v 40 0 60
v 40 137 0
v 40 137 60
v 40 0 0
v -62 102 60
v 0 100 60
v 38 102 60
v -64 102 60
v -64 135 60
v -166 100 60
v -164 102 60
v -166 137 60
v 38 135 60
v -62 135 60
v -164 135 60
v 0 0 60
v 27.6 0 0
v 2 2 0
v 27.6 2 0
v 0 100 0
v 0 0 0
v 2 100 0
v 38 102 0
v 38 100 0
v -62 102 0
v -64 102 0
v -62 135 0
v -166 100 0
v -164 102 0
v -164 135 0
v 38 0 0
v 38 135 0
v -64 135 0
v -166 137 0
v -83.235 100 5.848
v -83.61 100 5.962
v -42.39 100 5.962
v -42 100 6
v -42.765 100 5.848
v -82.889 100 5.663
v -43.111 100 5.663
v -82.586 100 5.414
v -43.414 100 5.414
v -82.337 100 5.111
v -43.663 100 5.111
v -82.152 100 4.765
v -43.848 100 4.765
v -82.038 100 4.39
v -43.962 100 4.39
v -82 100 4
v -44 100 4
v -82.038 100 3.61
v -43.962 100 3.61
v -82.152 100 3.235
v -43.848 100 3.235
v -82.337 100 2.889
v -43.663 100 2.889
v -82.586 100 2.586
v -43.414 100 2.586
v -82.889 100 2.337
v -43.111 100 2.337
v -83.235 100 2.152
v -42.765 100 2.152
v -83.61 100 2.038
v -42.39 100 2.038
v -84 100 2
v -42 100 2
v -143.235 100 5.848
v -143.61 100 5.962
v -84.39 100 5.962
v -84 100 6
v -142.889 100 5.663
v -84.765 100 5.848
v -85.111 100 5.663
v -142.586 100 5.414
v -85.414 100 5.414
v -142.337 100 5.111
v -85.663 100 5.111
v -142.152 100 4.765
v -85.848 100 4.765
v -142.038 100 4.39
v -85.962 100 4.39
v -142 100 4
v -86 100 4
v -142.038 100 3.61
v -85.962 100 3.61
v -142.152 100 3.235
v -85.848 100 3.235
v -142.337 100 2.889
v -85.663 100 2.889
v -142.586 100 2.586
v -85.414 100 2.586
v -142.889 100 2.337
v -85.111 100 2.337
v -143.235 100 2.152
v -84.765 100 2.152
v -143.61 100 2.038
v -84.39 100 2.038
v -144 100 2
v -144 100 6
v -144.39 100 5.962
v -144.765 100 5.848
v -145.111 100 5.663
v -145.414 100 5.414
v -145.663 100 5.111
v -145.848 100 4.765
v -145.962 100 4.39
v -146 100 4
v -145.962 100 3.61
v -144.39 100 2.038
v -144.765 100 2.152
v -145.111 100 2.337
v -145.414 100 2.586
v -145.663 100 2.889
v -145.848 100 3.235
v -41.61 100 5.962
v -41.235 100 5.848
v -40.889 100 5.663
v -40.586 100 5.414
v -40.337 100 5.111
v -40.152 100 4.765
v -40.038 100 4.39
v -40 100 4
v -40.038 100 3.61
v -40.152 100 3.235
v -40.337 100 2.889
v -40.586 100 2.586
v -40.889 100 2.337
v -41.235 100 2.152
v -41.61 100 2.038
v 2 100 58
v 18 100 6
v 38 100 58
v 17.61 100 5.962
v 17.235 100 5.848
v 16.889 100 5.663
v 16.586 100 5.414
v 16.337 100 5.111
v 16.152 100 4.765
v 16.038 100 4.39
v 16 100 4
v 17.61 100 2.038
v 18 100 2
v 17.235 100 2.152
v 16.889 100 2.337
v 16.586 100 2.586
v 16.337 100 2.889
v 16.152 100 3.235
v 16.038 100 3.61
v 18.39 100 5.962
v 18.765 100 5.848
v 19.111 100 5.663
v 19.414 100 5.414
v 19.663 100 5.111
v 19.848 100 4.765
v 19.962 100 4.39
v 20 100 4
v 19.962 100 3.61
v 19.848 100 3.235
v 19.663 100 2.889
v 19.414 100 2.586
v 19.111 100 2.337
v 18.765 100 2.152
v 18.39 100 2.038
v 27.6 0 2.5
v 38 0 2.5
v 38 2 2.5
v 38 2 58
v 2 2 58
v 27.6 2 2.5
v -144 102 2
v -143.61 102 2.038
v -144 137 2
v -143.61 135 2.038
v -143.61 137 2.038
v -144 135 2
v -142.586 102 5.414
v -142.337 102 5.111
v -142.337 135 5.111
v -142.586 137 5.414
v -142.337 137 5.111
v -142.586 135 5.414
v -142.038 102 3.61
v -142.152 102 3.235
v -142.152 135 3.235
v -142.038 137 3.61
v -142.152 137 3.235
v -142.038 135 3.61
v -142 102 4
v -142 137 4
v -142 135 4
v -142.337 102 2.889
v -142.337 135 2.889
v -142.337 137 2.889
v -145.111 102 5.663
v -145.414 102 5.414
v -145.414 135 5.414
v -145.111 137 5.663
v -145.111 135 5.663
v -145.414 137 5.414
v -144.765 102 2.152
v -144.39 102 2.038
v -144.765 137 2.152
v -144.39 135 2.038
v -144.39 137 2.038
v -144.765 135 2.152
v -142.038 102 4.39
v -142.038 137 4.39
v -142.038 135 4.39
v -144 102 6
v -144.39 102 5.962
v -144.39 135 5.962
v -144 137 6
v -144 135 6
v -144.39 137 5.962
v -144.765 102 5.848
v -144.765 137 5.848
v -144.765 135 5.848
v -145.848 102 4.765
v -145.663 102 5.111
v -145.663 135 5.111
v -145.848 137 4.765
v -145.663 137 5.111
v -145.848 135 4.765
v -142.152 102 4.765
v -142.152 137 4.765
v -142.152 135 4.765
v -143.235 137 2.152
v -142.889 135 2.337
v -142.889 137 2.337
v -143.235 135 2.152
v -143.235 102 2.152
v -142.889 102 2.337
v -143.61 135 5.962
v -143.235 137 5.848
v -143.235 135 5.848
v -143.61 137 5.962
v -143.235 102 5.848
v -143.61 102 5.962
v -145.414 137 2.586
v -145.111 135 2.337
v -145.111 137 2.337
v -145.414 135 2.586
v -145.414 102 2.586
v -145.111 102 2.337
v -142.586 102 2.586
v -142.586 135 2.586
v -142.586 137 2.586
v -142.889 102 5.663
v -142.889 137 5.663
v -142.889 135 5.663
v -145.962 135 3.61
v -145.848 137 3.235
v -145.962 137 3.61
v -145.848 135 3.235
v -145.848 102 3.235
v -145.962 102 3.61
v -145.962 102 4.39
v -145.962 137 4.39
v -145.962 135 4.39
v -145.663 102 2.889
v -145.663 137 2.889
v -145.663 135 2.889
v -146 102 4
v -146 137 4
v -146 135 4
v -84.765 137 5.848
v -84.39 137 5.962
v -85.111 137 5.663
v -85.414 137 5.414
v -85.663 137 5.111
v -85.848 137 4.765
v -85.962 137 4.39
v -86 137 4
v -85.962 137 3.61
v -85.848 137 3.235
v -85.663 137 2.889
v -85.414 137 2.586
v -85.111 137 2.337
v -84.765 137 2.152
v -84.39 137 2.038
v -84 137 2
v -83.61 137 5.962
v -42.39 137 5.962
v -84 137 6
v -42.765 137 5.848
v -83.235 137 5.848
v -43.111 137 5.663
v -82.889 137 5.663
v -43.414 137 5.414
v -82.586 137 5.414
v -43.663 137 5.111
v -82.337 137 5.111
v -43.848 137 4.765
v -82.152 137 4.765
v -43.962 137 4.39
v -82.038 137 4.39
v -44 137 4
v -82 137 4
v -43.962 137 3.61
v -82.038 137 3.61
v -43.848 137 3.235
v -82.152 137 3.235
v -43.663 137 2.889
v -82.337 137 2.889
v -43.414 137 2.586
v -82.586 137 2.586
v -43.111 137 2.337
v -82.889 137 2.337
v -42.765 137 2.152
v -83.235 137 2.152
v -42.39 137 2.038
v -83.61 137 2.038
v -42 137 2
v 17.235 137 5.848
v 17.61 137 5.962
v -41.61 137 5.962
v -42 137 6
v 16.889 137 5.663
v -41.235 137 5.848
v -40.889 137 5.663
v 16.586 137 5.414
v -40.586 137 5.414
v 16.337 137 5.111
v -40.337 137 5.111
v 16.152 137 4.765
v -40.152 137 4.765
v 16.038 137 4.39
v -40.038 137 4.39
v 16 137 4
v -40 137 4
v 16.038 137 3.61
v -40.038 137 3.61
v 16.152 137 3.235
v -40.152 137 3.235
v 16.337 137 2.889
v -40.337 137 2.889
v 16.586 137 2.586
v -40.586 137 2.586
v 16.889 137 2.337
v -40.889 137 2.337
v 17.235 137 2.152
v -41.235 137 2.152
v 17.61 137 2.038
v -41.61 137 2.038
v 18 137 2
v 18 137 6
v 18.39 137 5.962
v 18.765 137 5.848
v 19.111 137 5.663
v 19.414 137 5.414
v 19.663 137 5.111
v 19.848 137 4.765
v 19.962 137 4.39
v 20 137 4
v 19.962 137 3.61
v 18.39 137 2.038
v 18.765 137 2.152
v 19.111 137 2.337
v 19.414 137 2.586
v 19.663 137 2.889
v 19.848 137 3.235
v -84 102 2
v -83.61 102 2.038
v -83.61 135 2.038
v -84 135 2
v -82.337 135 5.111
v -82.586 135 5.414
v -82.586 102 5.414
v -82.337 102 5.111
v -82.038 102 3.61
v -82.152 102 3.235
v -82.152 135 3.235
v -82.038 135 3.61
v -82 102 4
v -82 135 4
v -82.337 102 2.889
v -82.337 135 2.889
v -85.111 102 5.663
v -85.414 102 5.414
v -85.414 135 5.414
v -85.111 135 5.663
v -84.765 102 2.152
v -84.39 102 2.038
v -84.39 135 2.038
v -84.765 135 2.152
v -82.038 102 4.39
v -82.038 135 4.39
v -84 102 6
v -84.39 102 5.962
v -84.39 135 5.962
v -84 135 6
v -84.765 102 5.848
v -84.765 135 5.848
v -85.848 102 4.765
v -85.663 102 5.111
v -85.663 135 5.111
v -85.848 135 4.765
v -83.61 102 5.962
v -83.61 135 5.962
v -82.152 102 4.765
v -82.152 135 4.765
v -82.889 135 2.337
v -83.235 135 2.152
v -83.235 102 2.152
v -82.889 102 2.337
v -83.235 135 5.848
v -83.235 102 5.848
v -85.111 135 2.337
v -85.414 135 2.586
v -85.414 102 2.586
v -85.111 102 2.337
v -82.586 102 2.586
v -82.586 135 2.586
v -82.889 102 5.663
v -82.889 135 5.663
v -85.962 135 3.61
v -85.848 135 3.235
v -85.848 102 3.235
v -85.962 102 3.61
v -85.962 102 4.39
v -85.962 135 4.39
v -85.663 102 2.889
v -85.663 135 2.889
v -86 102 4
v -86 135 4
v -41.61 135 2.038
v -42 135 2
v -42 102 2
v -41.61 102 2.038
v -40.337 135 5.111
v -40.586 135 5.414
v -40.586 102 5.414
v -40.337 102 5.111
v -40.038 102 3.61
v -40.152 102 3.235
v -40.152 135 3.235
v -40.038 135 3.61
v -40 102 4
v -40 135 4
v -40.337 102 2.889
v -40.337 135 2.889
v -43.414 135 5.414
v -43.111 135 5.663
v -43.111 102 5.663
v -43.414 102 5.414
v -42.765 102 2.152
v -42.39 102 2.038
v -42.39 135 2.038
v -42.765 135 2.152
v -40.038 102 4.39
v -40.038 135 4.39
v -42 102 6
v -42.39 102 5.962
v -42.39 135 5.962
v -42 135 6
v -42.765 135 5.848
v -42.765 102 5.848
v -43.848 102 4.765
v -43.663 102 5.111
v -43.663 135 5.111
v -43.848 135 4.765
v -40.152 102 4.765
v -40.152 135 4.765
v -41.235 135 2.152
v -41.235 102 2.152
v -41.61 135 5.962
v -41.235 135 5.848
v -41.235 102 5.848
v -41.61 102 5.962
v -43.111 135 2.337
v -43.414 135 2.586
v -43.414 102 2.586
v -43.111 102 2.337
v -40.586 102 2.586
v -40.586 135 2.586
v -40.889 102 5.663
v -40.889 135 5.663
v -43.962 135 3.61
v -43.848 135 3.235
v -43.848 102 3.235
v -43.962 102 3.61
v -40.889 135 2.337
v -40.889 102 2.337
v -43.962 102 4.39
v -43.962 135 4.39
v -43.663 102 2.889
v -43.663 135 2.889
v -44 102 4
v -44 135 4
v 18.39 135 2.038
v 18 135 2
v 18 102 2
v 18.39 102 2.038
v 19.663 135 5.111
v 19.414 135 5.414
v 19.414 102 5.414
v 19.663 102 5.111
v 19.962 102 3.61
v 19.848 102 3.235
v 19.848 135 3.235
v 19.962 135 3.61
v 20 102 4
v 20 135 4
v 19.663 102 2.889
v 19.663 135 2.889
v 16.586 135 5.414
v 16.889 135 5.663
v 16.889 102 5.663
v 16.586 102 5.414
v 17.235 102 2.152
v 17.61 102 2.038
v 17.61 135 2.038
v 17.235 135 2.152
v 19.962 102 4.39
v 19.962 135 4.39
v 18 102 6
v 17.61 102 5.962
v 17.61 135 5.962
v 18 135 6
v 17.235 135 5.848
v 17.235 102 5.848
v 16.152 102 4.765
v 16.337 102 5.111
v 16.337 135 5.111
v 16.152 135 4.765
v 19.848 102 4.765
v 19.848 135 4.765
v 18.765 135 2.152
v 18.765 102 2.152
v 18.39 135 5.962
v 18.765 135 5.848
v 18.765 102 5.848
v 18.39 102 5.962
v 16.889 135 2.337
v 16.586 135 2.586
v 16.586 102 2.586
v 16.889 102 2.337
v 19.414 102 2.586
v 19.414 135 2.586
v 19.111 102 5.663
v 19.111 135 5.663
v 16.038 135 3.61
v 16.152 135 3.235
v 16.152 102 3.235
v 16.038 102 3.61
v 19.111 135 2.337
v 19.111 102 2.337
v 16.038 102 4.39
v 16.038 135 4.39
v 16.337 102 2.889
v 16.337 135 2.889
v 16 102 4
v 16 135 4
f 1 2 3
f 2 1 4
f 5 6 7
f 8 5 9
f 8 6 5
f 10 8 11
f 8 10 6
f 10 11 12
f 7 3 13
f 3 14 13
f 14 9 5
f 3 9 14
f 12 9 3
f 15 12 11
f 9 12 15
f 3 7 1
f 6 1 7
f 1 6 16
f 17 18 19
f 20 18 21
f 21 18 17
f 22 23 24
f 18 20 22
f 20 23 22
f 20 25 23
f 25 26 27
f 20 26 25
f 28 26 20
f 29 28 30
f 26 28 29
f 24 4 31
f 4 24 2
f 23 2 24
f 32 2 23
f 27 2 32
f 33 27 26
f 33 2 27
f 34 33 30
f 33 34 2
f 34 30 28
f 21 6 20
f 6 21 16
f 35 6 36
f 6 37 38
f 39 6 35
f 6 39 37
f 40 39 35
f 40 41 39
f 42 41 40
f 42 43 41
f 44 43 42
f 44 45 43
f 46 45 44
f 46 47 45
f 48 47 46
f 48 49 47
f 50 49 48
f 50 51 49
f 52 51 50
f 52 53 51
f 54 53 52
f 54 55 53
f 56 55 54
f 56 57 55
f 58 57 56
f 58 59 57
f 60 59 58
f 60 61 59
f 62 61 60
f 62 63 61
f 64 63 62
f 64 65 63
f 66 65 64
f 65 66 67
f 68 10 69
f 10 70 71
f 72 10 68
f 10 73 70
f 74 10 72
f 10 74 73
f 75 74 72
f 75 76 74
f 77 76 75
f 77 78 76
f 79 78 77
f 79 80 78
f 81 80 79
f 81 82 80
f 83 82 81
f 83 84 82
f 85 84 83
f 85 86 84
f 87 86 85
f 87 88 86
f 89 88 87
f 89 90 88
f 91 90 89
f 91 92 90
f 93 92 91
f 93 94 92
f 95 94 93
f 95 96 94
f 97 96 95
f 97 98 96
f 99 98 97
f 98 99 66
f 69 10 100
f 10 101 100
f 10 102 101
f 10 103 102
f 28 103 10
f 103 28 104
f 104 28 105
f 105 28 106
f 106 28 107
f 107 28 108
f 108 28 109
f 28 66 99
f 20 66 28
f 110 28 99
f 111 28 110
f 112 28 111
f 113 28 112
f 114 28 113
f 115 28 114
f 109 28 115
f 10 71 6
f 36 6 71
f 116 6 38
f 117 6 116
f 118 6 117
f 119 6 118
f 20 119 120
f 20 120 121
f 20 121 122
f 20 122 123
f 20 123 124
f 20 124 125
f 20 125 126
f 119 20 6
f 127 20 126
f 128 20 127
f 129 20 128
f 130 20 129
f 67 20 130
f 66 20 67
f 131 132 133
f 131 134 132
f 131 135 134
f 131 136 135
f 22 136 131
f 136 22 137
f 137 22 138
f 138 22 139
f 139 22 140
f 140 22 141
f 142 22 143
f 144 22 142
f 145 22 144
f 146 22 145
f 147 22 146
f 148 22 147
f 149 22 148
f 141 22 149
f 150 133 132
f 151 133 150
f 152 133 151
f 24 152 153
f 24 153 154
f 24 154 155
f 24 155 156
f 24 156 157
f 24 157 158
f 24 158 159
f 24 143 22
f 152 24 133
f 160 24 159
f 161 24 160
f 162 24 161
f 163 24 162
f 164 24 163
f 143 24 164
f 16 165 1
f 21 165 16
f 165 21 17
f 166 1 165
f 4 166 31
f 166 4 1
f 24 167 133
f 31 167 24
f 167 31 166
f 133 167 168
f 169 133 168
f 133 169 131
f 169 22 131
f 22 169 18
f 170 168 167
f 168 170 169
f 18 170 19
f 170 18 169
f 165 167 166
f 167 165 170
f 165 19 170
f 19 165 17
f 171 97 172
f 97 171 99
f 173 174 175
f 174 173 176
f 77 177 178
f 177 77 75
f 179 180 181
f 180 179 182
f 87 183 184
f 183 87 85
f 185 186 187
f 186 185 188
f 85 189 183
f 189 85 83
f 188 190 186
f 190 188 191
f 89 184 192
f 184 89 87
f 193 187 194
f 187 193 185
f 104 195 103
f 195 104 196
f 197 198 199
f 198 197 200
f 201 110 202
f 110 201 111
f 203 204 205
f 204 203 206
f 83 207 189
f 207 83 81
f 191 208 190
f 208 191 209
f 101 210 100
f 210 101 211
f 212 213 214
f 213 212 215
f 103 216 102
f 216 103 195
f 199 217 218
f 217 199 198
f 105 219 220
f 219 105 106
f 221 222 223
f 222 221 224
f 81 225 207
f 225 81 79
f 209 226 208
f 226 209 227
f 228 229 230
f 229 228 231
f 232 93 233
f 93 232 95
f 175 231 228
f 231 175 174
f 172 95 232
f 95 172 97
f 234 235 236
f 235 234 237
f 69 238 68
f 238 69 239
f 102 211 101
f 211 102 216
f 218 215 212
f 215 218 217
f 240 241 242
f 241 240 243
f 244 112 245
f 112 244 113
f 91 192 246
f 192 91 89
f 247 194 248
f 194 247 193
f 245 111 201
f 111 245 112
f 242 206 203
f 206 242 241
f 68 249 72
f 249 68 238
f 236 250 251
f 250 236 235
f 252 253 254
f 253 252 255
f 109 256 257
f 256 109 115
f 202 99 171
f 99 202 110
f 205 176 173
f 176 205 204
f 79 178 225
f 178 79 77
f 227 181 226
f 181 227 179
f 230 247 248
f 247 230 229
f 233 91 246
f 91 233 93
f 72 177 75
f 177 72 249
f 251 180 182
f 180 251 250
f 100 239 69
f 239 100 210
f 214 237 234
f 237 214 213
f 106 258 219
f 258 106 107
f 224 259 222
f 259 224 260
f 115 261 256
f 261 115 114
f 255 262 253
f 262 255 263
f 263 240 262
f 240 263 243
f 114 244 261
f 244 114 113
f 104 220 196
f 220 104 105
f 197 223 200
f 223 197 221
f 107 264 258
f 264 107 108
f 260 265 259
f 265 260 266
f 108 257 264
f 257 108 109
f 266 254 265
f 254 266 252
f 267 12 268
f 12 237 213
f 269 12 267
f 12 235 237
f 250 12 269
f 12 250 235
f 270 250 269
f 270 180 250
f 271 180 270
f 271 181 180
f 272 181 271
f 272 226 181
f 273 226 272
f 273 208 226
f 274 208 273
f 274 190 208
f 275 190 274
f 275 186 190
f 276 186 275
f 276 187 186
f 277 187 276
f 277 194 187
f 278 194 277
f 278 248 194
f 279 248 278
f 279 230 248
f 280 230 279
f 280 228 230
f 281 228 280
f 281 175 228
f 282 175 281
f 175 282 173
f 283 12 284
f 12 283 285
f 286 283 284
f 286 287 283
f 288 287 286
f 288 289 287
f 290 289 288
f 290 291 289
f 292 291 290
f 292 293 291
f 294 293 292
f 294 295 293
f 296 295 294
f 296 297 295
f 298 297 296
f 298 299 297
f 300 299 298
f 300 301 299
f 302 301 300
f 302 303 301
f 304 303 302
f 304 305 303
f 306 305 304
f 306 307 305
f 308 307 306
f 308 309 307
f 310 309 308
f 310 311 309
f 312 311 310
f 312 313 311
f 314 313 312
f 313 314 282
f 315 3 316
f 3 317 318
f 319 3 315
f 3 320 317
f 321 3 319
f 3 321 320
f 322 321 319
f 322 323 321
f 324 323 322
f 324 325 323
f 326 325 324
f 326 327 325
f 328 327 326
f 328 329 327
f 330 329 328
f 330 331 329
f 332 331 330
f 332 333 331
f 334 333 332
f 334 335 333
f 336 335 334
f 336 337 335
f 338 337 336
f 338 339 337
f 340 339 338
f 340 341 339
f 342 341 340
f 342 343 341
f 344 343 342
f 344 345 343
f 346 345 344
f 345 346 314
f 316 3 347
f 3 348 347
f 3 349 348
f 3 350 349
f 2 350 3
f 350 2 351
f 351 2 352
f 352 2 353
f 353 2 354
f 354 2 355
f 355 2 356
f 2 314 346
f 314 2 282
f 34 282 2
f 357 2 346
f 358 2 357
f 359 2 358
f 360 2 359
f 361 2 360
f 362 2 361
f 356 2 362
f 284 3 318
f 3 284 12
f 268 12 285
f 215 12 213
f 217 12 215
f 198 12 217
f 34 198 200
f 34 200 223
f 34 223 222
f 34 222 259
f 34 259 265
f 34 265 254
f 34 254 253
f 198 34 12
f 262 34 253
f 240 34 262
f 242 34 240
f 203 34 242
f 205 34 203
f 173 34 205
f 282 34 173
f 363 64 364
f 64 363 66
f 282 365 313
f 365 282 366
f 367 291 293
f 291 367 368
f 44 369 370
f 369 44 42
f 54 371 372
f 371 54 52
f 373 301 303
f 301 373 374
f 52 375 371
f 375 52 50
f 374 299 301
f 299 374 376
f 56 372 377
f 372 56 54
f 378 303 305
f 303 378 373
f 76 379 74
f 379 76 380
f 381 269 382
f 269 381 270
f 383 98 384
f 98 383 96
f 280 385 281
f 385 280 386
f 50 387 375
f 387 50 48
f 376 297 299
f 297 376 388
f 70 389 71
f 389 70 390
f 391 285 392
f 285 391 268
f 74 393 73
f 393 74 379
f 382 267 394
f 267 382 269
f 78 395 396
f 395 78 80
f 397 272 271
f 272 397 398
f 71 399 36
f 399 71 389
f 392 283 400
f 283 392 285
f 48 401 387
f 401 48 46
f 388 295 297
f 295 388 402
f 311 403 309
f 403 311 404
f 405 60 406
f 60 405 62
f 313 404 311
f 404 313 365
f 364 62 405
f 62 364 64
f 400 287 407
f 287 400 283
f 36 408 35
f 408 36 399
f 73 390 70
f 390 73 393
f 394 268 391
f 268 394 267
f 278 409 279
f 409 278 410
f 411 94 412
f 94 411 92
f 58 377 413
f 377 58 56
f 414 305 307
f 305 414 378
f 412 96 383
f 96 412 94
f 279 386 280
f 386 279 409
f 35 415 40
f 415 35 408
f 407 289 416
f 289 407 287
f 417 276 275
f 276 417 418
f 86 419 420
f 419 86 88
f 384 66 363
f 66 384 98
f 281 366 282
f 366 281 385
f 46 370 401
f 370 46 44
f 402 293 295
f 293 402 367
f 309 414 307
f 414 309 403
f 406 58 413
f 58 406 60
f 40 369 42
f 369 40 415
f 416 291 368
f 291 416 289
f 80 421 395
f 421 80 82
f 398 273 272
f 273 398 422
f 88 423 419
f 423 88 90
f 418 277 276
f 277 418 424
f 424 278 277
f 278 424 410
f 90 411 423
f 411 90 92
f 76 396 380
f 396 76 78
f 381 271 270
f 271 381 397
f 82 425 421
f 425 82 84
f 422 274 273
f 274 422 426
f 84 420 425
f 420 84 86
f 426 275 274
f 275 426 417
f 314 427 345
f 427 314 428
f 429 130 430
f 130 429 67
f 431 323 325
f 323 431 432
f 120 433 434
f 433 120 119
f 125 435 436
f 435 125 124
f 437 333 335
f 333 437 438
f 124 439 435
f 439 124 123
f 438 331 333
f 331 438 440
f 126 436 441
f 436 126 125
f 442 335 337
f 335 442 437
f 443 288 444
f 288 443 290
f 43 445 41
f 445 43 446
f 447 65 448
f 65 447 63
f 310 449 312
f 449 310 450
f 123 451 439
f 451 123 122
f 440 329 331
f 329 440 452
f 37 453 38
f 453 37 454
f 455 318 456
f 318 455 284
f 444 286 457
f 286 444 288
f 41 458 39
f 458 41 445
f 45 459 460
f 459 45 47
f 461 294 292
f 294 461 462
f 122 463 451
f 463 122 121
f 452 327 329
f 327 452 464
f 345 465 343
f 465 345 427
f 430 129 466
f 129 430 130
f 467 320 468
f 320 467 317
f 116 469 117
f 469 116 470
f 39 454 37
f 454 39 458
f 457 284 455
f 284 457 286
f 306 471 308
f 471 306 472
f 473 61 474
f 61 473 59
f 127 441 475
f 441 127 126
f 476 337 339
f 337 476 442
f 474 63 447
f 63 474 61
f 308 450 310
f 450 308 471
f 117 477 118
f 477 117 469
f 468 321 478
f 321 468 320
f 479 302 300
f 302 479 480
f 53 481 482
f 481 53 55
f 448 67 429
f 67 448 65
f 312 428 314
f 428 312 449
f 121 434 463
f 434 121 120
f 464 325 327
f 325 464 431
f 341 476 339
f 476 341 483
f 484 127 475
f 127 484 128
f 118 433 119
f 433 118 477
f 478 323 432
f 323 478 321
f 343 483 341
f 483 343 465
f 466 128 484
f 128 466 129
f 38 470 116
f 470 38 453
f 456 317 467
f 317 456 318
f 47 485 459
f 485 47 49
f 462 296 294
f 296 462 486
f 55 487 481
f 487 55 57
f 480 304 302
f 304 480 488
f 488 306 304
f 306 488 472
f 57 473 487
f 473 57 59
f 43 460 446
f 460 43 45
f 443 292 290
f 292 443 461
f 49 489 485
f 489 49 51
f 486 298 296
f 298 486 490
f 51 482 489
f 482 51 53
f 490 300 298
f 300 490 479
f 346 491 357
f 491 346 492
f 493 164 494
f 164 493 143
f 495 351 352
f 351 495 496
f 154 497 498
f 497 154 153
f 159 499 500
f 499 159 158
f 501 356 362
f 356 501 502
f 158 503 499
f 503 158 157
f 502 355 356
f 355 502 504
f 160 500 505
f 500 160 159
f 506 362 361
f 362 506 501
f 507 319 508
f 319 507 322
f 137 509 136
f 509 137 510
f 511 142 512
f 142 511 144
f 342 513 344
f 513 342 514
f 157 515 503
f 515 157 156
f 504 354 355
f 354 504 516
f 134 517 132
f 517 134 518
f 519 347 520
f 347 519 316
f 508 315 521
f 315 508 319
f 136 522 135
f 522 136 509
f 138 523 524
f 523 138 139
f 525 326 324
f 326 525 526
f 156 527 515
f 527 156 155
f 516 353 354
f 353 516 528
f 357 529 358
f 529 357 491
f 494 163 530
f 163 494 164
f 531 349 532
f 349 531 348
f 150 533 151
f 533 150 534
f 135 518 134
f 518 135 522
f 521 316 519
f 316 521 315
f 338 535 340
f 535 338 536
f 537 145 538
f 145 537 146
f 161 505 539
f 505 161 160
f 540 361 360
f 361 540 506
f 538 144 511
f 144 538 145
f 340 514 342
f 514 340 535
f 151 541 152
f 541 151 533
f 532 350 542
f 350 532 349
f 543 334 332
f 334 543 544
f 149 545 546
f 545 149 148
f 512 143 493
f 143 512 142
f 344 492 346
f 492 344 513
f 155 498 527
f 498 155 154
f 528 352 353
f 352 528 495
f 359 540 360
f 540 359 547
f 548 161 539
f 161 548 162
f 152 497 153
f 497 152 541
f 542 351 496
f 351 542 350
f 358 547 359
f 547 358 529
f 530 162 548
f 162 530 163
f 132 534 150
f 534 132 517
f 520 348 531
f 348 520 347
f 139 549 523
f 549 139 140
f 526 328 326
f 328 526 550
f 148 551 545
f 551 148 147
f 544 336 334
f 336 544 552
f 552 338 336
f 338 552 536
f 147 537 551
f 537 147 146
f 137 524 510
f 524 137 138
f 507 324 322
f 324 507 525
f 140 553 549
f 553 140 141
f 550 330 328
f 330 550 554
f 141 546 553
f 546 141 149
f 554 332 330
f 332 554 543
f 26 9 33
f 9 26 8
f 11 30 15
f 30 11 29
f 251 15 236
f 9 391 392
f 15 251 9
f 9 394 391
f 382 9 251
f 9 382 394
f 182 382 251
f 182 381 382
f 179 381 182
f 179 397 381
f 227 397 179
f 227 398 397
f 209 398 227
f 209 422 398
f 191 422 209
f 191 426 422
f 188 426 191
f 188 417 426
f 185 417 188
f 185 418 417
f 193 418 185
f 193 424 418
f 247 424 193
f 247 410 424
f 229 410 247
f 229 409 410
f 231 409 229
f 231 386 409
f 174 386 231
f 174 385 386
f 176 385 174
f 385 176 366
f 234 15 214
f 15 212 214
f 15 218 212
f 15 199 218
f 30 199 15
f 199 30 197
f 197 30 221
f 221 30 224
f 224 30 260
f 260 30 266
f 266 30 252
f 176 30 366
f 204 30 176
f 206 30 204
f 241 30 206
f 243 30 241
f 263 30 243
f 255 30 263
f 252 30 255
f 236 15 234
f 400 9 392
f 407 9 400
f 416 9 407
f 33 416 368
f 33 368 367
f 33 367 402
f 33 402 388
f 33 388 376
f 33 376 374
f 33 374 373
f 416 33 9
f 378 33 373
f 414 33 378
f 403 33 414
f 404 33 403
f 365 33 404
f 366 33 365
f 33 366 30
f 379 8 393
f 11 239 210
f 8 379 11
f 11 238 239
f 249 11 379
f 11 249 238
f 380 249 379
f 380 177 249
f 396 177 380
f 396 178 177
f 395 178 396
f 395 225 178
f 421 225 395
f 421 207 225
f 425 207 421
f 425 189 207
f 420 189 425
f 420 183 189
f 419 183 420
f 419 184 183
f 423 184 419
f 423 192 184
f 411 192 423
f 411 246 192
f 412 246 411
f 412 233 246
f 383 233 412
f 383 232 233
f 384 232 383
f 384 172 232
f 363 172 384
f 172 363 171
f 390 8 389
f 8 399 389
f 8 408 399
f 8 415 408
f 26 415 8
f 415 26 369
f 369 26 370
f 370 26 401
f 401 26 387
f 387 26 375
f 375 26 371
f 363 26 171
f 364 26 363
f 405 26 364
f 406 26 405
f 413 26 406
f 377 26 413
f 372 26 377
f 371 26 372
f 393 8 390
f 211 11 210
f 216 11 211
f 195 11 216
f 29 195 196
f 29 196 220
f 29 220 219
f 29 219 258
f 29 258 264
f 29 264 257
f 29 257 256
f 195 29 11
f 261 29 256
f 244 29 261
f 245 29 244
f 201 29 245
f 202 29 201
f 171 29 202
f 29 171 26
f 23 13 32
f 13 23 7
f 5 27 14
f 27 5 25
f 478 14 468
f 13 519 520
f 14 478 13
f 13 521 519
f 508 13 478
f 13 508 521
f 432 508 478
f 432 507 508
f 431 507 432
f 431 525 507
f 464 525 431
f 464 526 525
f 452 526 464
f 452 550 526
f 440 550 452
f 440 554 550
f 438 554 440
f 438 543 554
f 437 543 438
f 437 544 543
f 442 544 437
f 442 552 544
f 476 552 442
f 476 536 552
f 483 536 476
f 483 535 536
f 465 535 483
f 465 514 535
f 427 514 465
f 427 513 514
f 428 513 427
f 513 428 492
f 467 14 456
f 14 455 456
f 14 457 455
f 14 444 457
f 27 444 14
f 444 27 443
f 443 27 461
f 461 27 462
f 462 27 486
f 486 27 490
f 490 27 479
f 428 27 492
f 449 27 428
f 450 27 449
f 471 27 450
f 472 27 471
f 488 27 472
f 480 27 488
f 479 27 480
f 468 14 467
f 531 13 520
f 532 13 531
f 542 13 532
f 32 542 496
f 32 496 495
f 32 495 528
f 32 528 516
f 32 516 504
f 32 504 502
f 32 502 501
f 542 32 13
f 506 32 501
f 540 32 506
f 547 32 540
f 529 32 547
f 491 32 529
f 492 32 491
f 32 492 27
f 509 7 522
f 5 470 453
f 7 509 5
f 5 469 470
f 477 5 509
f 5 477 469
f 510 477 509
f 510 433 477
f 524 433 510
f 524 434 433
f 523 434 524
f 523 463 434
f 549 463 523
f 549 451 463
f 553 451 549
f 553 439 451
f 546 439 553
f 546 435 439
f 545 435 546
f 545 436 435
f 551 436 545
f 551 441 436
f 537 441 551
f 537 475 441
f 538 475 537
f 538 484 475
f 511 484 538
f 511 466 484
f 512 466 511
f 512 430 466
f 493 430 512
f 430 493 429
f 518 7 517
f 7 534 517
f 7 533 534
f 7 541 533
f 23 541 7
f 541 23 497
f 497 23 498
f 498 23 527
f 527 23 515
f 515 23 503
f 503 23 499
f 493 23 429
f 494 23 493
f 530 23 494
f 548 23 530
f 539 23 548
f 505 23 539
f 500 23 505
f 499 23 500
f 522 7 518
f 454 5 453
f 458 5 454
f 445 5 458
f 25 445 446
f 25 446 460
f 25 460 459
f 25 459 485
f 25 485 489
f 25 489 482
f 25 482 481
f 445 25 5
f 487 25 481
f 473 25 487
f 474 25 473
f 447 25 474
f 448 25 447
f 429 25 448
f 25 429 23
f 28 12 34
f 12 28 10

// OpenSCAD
H = 60;
Wbase = 40;
Dbase = 100;
DcaseIn = 33;
WcaseIn = 100;
thick = 2;

difference() {
    cube([Wbase, Dbase, H]);
    translate([thick, thick, 0])
        cube([Wbase - thick * 2, Dbase - thick, H - thick]);
    translate([Wbase - thick - 10.4, 0, 0])
        cube([10.4, thick, thick + 0.5]);
}
translate([Wbase - WcaseIn * 2 - thick * 3, Dbase, 0]) {
    difference() {
        cube([WcaseIn * 2 + thick * 3, DcaseIn + thick * 2, H]);
        for (x = [thick, WcaseIn + thick * 2]) {
            translate([x, thick, 0])
                cube([WcaseIn, DcaseIn, H]);
            for (off = [20, WcaseIn - 20])
                translate([x + off, 0, 4])
                    rotate([-90, 0, 0])
                        cylinder(r = 2, h = DcaseIn + thick * 2, $fn = 32);
        }
    }
}
